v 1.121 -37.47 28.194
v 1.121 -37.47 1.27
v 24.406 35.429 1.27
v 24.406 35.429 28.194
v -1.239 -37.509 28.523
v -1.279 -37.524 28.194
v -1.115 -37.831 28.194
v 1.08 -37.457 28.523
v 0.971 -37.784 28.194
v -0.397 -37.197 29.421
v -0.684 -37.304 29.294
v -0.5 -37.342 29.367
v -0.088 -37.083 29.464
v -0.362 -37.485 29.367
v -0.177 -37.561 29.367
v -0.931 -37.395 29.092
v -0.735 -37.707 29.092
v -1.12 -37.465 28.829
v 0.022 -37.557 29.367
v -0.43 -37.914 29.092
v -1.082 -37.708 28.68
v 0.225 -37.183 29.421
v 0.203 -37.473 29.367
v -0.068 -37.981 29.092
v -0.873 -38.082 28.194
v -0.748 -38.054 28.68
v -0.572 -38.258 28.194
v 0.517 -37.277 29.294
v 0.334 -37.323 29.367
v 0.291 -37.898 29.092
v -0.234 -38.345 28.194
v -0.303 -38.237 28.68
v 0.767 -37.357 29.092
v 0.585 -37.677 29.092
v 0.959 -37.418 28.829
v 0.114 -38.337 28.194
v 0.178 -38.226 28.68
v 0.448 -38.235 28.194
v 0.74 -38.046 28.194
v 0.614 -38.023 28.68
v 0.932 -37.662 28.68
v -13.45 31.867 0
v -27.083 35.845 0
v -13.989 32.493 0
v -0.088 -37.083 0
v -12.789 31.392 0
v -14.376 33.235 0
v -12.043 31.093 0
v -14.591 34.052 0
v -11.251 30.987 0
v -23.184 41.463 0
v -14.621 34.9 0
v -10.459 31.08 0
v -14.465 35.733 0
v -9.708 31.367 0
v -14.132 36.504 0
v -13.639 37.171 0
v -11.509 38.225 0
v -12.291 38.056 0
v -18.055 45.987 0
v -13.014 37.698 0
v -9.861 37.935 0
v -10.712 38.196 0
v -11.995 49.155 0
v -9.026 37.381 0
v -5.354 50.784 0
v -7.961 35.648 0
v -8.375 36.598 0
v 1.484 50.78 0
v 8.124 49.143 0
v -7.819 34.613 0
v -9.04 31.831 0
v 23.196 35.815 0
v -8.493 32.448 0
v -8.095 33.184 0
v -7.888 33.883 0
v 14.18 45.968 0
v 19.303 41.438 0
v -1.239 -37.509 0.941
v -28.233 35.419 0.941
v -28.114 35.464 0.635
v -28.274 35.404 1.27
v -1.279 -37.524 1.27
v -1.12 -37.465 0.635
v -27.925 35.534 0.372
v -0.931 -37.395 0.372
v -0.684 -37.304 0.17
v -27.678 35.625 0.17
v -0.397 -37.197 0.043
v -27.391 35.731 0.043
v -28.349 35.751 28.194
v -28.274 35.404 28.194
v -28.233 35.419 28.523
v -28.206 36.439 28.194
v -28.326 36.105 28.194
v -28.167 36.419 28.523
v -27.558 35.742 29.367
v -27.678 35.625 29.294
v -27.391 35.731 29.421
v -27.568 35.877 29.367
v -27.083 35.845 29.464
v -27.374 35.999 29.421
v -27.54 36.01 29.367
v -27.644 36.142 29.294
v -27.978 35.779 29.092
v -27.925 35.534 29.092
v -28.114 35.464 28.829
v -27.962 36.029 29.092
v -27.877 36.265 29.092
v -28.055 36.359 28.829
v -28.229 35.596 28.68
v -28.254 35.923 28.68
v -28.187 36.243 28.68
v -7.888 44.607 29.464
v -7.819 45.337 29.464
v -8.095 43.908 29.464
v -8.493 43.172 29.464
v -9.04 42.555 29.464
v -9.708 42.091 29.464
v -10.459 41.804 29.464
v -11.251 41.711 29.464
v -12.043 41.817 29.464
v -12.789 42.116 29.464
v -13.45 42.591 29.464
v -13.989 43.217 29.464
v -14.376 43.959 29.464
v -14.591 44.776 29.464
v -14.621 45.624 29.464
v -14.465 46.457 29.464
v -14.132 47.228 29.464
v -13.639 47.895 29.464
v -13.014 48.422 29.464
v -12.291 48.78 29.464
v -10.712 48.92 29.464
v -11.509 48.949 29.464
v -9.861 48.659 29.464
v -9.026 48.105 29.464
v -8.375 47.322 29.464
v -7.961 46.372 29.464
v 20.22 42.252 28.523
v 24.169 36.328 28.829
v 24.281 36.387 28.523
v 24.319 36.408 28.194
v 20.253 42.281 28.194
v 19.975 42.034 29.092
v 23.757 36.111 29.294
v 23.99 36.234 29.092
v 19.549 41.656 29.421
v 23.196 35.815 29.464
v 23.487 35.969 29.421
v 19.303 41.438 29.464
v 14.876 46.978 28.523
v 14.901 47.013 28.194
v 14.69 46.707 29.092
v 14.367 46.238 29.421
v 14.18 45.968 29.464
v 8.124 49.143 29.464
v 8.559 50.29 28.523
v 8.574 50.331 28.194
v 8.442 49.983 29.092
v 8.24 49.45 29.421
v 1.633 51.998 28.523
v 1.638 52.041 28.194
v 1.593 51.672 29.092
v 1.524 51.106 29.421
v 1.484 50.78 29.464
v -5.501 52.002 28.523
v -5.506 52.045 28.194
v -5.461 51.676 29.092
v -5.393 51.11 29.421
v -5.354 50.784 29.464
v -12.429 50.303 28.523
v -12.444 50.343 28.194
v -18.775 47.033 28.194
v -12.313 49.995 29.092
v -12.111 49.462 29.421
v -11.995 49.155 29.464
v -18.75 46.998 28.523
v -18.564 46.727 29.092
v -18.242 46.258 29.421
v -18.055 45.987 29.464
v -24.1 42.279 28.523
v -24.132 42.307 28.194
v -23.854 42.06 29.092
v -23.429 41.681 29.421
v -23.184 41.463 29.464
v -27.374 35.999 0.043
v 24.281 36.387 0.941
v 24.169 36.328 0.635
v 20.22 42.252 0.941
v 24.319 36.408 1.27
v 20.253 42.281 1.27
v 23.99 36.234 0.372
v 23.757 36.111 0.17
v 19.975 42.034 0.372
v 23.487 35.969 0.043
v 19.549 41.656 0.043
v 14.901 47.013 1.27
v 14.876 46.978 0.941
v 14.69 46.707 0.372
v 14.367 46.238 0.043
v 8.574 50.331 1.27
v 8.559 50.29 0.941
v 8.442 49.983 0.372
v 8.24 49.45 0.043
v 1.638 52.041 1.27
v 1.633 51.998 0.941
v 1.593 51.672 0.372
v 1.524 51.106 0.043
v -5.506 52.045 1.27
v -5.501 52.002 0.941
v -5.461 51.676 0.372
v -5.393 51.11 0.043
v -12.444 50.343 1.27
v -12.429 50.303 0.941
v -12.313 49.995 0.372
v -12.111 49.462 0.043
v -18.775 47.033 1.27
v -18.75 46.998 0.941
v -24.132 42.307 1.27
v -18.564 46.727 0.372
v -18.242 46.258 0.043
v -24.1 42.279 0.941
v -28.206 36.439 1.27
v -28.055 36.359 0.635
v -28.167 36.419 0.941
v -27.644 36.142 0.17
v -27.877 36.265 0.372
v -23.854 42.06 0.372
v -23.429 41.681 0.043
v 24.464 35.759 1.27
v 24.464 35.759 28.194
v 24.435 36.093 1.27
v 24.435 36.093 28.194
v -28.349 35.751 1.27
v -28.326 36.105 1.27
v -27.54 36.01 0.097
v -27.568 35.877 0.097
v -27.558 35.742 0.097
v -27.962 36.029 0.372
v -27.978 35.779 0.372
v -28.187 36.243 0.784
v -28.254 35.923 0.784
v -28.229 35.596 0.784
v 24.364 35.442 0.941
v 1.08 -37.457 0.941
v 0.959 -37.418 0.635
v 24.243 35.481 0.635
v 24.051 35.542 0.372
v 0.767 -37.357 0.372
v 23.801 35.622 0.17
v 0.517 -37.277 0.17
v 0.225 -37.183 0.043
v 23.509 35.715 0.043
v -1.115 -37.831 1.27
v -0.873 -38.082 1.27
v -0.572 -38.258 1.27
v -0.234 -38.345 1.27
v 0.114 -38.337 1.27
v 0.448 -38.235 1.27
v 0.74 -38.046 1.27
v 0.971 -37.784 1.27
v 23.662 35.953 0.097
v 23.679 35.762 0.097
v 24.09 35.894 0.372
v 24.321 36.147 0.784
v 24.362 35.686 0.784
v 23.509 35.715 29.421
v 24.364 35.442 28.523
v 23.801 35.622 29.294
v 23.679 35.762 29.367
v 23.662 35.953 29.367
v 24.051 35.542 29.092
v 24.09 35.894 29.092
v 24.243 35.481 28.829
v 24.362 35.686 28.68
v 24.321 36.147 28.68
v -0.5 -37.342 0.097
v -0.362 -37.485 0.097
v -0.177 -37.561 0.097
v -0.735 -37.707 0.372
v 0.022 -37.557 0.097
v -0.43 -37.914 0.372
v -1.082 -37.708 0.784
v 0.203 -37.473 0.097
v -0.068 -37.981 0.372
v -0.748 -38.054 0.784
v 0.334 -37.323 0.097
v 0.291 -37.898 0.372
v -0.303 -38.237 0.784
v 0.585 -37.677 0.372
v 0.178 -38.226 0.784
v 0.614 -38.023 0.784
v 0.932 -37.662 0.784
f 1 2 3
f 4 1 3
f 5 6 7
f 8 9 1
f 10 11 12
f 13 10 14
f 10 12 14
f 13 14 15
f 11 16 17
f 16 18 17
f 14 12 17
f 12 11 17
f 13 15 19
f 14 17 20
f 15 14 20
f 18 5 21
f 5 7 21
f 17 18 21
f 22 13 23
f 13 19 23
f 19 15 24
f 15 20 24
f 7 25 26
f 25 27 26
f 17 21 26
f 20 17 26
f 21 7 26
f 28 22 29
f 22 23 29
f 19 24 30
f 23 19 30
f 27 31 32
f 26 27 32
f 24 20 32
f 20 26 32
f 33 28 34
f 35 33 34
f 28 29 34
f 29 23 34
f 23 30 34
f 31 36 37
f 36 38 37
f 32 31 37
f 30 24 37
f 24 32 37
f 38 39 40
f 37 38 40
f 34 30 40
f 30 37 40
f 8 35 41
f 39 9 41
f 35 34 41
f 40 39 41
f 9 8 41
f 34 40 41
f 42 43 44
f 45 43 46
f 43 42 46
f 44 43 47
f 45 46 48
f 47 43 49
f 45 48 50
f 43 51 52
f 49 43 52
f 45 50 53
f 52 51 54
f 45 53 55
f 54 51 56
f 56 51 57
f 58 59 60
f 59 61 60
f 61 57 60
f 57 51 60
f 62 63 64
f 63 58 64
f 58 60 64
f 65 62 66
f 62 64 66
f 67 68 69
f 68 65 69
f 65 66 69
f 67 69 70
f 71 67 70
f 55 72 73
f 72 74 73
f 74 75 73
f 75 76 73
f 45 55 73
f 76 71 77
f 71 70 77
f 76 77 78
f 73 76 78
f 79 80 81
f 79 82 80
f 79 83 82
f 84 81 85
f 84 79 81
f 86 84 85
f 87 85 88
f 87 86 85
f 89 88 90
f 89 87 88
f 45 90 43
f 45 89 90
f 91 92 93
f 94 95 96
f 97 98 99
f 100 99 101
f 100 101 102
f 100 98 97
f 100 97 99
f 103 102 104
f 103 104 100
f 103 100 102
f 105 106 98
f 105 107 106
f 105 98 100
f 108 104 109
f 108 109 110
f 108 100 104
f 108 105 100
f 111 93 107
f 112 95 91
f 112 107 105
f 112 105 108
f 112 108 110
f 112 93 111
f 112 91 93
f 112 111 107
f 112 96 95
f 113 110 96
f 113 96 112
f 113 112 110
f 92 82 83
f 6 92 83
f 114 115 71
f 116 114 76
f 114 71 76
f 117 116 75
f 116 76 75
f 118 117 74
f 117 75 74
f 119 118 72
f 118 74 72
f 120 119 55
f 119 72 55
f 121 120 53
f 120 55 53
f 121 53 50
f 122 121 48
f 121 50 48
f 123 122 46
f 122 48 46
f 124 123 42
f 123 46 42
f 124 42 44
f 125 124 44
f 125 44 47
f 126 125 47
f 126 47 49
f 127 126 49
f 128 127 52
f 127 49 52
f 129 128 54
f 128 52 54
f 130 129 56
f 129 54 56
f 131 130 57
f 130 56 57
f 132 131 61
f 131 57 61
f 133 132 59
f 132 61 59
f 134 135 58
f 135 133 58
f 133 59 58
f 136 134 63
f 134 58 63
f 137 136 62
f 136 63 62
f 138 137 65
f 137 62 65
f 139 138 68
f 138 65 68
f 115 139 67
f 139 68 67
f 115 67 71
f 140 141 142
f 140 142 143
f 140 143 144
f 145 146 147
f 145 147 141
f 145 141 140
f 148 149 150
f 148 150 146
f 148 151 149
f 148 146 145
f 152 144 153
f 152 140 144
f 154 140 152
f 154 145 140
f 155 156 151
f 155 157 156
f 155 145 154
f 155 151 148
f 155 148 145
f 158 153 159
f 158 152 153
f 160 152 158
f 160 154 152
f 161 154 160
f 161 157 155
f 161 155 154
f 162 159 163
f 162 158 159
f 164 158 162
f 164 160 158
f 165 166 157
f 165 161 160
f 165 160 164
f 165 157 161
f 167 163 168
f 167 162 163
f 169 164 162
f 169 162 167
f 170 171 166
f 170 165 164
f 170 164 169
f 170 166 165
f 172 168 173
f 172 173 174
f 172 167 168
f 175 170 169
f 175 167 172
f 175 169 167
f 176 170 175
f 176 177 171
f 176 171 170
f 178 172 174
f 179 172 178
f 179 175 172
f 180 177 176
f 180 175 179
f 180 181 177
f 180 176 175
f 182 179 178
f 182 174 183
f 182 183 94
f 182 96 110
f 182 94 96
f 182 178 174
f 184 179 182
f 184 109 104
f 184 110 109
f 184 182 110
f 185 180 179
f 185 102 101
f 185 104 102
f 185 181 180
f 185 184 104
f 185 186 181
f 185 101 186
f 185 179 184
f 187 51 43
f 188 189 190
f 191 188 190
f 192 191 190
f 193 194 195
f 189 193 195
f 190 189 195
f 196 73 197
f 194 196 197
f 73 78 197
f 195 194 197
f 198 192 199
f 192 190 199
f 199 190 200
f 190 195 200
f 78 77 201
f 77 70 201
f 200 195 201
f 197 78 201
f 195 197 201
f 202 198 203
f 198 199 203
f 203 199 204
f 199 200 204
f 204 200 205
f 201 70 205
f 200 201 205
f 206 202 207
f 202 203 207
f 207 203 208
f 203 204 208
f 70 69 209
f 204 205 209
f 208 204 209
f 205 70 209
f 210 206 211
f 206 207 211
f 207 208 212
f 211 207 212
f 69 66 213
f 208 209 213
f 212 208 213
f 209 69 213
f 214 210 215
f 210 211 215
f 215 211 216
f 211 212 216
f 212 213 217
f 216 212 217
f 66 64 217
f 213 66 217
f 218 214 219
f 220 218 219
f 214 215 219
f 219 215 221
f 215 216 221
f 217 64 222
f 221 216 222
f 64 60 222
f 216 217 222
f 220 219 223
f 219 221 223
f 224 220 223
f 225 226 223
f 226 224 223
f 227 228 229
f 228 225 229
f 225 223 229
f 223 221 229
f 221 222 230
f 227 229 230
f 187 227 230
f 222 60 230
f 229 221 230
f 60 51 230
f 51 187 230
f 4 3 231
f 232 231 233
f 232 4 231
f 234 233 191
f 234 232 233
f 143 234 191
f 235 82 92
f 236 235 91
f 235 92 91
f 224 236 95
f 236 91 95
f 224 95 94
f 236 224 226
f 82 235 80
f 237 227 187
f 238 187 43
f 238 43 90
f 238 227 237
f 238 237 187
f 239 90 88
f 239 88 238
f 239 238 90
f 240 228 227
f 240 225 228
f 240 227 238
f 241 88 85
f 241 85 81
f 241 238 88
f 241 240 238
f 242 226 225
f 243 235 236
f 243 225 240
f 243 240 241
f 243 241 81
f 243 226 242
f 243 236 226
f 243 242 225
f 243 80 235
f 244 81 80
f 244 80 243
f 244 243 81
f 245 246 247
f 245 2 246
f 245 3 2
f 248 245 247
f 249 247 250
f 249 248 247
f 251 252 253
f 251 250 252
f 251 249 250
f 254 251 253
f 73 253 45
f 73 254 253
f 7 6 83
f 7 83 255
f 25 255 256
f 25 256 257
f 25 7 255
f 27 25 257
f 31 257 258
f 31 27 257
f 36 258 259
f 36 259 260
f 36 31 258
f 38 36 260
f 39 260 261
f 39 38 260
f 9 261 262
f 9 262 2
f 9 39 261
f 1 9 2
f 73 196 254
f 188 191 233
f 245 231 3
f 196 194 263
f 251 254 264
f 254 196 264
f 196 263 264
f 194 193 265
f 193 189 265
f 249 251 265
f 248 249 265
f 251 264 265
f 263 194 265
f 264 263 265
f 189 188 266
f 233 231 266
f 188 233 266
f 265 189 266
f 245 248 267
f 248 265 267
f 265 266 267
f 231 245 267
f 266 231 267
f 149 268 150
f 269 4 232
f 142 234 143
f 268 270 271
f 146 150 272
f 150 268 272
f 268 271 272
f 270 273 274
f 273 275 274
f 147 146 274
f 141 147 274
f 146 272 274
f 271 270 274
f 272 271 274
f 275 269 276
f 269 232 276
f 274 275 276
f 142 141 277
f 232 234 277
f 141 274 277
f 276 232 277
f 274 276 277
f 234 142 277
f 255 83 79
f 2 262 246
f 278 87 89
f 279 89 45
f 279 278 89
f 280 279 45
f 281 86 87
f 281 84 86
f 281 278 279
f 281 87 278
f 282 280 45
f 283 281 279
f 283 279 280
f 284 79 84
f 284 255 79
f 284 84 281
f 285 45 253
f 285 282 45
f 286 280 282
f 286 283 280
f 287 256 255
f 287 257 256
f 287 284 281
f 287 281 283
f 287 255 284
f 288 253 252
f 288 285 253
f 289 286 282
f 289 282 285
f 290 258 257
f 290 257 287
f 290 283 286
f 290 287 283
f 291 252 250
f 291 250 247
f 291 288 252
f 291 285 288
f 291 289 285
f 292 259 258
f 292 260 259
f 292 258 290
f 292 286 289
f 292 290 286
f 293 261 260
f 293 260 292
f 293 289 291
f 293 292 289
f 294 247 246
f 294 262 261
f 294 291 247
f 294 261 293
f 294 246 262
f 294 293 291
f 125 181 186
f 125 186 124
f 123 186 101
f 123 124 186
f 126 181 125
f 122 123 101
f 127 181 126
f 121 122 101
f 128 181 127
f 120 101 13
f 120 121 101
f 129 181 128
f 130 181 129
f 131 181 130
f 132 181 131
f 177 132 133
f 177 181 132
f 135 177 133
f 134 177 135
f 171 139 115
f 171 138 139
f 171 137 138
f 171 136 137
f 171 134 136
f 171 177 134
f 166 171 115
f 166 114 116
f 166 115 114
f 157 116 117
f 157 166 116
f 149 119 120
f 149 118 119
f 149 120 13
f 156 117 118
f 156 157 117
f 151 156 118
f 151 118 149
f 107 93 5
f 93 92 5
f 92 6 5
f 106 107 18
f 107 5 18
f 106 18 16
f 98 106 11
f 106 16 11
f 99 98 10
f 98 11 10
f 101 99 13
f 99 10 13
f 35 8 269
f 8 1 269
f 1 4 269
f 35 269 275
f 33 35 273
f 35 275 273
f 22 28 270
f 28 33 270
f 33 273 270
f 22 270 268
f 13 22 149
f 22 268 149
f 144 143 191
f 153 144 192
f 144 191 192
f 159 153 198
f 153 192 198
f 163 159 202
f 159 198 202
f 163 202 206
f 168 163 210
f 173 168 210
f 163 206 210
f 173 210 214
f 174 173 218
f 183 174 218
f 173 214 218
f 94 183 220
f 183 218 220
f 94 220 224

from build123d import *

# Parameters (mm, degrees)
F1_DEPTH = 29.464
F2_R     = 1.27
F5_R     = 3.406625
F6_DEPTH = 69.85


with BuildPart() as f1:
    # F0 (on Top) → F1 (new body)
    with BuildSketch(Plane.XY):
        with BuildLine():
            Line((-28.468408, 35.929885), (0, -40.98073))
            Line((0, -40.98073), (24.565481, 35.929885))
            ThreePointArc((24.565481, 35.929885), (-1.951464, 52.258484), (-28.468408, 35.929885))
        make_face()
    extrude(amount=F1_DEPTH)

    # F2
    f2_edges = [f1.edges().sort_by_distance(p)[0] for p in [
        (0, -40.98073, 14.732),
        (-14.234204, -2.525423, 0),
        (-14.234204, -2.525423, 29.464),
        (12.28274, -2.525423, 0),
        (12.28274, -2.525423, 29.464),
        (-1.951464, 52.258484, 29.464),
        (24.565481, 35.929885, 14.732),
        (-28.468408, 35.929885, 14.732),
        (-1.951464, 52.258484, 0),
    ]]
    fillet(f2_edges, radius=F2_R)

    # F5 (on face) → F6 (cut, symmetric)
    with BuildSketch(Plane(origin=(0, 0.313899, 0.862432), x_dir=(1, 0, 0), z_dir=(0, -0.34202, -0.939693))):
        with Locations((-11.22538, -32.5252)):
            Circle(F5_R)
    extrude(amount=F6_DEPTH, both=True, mode=Mode.SUBTRACT)


solid = f1.part
